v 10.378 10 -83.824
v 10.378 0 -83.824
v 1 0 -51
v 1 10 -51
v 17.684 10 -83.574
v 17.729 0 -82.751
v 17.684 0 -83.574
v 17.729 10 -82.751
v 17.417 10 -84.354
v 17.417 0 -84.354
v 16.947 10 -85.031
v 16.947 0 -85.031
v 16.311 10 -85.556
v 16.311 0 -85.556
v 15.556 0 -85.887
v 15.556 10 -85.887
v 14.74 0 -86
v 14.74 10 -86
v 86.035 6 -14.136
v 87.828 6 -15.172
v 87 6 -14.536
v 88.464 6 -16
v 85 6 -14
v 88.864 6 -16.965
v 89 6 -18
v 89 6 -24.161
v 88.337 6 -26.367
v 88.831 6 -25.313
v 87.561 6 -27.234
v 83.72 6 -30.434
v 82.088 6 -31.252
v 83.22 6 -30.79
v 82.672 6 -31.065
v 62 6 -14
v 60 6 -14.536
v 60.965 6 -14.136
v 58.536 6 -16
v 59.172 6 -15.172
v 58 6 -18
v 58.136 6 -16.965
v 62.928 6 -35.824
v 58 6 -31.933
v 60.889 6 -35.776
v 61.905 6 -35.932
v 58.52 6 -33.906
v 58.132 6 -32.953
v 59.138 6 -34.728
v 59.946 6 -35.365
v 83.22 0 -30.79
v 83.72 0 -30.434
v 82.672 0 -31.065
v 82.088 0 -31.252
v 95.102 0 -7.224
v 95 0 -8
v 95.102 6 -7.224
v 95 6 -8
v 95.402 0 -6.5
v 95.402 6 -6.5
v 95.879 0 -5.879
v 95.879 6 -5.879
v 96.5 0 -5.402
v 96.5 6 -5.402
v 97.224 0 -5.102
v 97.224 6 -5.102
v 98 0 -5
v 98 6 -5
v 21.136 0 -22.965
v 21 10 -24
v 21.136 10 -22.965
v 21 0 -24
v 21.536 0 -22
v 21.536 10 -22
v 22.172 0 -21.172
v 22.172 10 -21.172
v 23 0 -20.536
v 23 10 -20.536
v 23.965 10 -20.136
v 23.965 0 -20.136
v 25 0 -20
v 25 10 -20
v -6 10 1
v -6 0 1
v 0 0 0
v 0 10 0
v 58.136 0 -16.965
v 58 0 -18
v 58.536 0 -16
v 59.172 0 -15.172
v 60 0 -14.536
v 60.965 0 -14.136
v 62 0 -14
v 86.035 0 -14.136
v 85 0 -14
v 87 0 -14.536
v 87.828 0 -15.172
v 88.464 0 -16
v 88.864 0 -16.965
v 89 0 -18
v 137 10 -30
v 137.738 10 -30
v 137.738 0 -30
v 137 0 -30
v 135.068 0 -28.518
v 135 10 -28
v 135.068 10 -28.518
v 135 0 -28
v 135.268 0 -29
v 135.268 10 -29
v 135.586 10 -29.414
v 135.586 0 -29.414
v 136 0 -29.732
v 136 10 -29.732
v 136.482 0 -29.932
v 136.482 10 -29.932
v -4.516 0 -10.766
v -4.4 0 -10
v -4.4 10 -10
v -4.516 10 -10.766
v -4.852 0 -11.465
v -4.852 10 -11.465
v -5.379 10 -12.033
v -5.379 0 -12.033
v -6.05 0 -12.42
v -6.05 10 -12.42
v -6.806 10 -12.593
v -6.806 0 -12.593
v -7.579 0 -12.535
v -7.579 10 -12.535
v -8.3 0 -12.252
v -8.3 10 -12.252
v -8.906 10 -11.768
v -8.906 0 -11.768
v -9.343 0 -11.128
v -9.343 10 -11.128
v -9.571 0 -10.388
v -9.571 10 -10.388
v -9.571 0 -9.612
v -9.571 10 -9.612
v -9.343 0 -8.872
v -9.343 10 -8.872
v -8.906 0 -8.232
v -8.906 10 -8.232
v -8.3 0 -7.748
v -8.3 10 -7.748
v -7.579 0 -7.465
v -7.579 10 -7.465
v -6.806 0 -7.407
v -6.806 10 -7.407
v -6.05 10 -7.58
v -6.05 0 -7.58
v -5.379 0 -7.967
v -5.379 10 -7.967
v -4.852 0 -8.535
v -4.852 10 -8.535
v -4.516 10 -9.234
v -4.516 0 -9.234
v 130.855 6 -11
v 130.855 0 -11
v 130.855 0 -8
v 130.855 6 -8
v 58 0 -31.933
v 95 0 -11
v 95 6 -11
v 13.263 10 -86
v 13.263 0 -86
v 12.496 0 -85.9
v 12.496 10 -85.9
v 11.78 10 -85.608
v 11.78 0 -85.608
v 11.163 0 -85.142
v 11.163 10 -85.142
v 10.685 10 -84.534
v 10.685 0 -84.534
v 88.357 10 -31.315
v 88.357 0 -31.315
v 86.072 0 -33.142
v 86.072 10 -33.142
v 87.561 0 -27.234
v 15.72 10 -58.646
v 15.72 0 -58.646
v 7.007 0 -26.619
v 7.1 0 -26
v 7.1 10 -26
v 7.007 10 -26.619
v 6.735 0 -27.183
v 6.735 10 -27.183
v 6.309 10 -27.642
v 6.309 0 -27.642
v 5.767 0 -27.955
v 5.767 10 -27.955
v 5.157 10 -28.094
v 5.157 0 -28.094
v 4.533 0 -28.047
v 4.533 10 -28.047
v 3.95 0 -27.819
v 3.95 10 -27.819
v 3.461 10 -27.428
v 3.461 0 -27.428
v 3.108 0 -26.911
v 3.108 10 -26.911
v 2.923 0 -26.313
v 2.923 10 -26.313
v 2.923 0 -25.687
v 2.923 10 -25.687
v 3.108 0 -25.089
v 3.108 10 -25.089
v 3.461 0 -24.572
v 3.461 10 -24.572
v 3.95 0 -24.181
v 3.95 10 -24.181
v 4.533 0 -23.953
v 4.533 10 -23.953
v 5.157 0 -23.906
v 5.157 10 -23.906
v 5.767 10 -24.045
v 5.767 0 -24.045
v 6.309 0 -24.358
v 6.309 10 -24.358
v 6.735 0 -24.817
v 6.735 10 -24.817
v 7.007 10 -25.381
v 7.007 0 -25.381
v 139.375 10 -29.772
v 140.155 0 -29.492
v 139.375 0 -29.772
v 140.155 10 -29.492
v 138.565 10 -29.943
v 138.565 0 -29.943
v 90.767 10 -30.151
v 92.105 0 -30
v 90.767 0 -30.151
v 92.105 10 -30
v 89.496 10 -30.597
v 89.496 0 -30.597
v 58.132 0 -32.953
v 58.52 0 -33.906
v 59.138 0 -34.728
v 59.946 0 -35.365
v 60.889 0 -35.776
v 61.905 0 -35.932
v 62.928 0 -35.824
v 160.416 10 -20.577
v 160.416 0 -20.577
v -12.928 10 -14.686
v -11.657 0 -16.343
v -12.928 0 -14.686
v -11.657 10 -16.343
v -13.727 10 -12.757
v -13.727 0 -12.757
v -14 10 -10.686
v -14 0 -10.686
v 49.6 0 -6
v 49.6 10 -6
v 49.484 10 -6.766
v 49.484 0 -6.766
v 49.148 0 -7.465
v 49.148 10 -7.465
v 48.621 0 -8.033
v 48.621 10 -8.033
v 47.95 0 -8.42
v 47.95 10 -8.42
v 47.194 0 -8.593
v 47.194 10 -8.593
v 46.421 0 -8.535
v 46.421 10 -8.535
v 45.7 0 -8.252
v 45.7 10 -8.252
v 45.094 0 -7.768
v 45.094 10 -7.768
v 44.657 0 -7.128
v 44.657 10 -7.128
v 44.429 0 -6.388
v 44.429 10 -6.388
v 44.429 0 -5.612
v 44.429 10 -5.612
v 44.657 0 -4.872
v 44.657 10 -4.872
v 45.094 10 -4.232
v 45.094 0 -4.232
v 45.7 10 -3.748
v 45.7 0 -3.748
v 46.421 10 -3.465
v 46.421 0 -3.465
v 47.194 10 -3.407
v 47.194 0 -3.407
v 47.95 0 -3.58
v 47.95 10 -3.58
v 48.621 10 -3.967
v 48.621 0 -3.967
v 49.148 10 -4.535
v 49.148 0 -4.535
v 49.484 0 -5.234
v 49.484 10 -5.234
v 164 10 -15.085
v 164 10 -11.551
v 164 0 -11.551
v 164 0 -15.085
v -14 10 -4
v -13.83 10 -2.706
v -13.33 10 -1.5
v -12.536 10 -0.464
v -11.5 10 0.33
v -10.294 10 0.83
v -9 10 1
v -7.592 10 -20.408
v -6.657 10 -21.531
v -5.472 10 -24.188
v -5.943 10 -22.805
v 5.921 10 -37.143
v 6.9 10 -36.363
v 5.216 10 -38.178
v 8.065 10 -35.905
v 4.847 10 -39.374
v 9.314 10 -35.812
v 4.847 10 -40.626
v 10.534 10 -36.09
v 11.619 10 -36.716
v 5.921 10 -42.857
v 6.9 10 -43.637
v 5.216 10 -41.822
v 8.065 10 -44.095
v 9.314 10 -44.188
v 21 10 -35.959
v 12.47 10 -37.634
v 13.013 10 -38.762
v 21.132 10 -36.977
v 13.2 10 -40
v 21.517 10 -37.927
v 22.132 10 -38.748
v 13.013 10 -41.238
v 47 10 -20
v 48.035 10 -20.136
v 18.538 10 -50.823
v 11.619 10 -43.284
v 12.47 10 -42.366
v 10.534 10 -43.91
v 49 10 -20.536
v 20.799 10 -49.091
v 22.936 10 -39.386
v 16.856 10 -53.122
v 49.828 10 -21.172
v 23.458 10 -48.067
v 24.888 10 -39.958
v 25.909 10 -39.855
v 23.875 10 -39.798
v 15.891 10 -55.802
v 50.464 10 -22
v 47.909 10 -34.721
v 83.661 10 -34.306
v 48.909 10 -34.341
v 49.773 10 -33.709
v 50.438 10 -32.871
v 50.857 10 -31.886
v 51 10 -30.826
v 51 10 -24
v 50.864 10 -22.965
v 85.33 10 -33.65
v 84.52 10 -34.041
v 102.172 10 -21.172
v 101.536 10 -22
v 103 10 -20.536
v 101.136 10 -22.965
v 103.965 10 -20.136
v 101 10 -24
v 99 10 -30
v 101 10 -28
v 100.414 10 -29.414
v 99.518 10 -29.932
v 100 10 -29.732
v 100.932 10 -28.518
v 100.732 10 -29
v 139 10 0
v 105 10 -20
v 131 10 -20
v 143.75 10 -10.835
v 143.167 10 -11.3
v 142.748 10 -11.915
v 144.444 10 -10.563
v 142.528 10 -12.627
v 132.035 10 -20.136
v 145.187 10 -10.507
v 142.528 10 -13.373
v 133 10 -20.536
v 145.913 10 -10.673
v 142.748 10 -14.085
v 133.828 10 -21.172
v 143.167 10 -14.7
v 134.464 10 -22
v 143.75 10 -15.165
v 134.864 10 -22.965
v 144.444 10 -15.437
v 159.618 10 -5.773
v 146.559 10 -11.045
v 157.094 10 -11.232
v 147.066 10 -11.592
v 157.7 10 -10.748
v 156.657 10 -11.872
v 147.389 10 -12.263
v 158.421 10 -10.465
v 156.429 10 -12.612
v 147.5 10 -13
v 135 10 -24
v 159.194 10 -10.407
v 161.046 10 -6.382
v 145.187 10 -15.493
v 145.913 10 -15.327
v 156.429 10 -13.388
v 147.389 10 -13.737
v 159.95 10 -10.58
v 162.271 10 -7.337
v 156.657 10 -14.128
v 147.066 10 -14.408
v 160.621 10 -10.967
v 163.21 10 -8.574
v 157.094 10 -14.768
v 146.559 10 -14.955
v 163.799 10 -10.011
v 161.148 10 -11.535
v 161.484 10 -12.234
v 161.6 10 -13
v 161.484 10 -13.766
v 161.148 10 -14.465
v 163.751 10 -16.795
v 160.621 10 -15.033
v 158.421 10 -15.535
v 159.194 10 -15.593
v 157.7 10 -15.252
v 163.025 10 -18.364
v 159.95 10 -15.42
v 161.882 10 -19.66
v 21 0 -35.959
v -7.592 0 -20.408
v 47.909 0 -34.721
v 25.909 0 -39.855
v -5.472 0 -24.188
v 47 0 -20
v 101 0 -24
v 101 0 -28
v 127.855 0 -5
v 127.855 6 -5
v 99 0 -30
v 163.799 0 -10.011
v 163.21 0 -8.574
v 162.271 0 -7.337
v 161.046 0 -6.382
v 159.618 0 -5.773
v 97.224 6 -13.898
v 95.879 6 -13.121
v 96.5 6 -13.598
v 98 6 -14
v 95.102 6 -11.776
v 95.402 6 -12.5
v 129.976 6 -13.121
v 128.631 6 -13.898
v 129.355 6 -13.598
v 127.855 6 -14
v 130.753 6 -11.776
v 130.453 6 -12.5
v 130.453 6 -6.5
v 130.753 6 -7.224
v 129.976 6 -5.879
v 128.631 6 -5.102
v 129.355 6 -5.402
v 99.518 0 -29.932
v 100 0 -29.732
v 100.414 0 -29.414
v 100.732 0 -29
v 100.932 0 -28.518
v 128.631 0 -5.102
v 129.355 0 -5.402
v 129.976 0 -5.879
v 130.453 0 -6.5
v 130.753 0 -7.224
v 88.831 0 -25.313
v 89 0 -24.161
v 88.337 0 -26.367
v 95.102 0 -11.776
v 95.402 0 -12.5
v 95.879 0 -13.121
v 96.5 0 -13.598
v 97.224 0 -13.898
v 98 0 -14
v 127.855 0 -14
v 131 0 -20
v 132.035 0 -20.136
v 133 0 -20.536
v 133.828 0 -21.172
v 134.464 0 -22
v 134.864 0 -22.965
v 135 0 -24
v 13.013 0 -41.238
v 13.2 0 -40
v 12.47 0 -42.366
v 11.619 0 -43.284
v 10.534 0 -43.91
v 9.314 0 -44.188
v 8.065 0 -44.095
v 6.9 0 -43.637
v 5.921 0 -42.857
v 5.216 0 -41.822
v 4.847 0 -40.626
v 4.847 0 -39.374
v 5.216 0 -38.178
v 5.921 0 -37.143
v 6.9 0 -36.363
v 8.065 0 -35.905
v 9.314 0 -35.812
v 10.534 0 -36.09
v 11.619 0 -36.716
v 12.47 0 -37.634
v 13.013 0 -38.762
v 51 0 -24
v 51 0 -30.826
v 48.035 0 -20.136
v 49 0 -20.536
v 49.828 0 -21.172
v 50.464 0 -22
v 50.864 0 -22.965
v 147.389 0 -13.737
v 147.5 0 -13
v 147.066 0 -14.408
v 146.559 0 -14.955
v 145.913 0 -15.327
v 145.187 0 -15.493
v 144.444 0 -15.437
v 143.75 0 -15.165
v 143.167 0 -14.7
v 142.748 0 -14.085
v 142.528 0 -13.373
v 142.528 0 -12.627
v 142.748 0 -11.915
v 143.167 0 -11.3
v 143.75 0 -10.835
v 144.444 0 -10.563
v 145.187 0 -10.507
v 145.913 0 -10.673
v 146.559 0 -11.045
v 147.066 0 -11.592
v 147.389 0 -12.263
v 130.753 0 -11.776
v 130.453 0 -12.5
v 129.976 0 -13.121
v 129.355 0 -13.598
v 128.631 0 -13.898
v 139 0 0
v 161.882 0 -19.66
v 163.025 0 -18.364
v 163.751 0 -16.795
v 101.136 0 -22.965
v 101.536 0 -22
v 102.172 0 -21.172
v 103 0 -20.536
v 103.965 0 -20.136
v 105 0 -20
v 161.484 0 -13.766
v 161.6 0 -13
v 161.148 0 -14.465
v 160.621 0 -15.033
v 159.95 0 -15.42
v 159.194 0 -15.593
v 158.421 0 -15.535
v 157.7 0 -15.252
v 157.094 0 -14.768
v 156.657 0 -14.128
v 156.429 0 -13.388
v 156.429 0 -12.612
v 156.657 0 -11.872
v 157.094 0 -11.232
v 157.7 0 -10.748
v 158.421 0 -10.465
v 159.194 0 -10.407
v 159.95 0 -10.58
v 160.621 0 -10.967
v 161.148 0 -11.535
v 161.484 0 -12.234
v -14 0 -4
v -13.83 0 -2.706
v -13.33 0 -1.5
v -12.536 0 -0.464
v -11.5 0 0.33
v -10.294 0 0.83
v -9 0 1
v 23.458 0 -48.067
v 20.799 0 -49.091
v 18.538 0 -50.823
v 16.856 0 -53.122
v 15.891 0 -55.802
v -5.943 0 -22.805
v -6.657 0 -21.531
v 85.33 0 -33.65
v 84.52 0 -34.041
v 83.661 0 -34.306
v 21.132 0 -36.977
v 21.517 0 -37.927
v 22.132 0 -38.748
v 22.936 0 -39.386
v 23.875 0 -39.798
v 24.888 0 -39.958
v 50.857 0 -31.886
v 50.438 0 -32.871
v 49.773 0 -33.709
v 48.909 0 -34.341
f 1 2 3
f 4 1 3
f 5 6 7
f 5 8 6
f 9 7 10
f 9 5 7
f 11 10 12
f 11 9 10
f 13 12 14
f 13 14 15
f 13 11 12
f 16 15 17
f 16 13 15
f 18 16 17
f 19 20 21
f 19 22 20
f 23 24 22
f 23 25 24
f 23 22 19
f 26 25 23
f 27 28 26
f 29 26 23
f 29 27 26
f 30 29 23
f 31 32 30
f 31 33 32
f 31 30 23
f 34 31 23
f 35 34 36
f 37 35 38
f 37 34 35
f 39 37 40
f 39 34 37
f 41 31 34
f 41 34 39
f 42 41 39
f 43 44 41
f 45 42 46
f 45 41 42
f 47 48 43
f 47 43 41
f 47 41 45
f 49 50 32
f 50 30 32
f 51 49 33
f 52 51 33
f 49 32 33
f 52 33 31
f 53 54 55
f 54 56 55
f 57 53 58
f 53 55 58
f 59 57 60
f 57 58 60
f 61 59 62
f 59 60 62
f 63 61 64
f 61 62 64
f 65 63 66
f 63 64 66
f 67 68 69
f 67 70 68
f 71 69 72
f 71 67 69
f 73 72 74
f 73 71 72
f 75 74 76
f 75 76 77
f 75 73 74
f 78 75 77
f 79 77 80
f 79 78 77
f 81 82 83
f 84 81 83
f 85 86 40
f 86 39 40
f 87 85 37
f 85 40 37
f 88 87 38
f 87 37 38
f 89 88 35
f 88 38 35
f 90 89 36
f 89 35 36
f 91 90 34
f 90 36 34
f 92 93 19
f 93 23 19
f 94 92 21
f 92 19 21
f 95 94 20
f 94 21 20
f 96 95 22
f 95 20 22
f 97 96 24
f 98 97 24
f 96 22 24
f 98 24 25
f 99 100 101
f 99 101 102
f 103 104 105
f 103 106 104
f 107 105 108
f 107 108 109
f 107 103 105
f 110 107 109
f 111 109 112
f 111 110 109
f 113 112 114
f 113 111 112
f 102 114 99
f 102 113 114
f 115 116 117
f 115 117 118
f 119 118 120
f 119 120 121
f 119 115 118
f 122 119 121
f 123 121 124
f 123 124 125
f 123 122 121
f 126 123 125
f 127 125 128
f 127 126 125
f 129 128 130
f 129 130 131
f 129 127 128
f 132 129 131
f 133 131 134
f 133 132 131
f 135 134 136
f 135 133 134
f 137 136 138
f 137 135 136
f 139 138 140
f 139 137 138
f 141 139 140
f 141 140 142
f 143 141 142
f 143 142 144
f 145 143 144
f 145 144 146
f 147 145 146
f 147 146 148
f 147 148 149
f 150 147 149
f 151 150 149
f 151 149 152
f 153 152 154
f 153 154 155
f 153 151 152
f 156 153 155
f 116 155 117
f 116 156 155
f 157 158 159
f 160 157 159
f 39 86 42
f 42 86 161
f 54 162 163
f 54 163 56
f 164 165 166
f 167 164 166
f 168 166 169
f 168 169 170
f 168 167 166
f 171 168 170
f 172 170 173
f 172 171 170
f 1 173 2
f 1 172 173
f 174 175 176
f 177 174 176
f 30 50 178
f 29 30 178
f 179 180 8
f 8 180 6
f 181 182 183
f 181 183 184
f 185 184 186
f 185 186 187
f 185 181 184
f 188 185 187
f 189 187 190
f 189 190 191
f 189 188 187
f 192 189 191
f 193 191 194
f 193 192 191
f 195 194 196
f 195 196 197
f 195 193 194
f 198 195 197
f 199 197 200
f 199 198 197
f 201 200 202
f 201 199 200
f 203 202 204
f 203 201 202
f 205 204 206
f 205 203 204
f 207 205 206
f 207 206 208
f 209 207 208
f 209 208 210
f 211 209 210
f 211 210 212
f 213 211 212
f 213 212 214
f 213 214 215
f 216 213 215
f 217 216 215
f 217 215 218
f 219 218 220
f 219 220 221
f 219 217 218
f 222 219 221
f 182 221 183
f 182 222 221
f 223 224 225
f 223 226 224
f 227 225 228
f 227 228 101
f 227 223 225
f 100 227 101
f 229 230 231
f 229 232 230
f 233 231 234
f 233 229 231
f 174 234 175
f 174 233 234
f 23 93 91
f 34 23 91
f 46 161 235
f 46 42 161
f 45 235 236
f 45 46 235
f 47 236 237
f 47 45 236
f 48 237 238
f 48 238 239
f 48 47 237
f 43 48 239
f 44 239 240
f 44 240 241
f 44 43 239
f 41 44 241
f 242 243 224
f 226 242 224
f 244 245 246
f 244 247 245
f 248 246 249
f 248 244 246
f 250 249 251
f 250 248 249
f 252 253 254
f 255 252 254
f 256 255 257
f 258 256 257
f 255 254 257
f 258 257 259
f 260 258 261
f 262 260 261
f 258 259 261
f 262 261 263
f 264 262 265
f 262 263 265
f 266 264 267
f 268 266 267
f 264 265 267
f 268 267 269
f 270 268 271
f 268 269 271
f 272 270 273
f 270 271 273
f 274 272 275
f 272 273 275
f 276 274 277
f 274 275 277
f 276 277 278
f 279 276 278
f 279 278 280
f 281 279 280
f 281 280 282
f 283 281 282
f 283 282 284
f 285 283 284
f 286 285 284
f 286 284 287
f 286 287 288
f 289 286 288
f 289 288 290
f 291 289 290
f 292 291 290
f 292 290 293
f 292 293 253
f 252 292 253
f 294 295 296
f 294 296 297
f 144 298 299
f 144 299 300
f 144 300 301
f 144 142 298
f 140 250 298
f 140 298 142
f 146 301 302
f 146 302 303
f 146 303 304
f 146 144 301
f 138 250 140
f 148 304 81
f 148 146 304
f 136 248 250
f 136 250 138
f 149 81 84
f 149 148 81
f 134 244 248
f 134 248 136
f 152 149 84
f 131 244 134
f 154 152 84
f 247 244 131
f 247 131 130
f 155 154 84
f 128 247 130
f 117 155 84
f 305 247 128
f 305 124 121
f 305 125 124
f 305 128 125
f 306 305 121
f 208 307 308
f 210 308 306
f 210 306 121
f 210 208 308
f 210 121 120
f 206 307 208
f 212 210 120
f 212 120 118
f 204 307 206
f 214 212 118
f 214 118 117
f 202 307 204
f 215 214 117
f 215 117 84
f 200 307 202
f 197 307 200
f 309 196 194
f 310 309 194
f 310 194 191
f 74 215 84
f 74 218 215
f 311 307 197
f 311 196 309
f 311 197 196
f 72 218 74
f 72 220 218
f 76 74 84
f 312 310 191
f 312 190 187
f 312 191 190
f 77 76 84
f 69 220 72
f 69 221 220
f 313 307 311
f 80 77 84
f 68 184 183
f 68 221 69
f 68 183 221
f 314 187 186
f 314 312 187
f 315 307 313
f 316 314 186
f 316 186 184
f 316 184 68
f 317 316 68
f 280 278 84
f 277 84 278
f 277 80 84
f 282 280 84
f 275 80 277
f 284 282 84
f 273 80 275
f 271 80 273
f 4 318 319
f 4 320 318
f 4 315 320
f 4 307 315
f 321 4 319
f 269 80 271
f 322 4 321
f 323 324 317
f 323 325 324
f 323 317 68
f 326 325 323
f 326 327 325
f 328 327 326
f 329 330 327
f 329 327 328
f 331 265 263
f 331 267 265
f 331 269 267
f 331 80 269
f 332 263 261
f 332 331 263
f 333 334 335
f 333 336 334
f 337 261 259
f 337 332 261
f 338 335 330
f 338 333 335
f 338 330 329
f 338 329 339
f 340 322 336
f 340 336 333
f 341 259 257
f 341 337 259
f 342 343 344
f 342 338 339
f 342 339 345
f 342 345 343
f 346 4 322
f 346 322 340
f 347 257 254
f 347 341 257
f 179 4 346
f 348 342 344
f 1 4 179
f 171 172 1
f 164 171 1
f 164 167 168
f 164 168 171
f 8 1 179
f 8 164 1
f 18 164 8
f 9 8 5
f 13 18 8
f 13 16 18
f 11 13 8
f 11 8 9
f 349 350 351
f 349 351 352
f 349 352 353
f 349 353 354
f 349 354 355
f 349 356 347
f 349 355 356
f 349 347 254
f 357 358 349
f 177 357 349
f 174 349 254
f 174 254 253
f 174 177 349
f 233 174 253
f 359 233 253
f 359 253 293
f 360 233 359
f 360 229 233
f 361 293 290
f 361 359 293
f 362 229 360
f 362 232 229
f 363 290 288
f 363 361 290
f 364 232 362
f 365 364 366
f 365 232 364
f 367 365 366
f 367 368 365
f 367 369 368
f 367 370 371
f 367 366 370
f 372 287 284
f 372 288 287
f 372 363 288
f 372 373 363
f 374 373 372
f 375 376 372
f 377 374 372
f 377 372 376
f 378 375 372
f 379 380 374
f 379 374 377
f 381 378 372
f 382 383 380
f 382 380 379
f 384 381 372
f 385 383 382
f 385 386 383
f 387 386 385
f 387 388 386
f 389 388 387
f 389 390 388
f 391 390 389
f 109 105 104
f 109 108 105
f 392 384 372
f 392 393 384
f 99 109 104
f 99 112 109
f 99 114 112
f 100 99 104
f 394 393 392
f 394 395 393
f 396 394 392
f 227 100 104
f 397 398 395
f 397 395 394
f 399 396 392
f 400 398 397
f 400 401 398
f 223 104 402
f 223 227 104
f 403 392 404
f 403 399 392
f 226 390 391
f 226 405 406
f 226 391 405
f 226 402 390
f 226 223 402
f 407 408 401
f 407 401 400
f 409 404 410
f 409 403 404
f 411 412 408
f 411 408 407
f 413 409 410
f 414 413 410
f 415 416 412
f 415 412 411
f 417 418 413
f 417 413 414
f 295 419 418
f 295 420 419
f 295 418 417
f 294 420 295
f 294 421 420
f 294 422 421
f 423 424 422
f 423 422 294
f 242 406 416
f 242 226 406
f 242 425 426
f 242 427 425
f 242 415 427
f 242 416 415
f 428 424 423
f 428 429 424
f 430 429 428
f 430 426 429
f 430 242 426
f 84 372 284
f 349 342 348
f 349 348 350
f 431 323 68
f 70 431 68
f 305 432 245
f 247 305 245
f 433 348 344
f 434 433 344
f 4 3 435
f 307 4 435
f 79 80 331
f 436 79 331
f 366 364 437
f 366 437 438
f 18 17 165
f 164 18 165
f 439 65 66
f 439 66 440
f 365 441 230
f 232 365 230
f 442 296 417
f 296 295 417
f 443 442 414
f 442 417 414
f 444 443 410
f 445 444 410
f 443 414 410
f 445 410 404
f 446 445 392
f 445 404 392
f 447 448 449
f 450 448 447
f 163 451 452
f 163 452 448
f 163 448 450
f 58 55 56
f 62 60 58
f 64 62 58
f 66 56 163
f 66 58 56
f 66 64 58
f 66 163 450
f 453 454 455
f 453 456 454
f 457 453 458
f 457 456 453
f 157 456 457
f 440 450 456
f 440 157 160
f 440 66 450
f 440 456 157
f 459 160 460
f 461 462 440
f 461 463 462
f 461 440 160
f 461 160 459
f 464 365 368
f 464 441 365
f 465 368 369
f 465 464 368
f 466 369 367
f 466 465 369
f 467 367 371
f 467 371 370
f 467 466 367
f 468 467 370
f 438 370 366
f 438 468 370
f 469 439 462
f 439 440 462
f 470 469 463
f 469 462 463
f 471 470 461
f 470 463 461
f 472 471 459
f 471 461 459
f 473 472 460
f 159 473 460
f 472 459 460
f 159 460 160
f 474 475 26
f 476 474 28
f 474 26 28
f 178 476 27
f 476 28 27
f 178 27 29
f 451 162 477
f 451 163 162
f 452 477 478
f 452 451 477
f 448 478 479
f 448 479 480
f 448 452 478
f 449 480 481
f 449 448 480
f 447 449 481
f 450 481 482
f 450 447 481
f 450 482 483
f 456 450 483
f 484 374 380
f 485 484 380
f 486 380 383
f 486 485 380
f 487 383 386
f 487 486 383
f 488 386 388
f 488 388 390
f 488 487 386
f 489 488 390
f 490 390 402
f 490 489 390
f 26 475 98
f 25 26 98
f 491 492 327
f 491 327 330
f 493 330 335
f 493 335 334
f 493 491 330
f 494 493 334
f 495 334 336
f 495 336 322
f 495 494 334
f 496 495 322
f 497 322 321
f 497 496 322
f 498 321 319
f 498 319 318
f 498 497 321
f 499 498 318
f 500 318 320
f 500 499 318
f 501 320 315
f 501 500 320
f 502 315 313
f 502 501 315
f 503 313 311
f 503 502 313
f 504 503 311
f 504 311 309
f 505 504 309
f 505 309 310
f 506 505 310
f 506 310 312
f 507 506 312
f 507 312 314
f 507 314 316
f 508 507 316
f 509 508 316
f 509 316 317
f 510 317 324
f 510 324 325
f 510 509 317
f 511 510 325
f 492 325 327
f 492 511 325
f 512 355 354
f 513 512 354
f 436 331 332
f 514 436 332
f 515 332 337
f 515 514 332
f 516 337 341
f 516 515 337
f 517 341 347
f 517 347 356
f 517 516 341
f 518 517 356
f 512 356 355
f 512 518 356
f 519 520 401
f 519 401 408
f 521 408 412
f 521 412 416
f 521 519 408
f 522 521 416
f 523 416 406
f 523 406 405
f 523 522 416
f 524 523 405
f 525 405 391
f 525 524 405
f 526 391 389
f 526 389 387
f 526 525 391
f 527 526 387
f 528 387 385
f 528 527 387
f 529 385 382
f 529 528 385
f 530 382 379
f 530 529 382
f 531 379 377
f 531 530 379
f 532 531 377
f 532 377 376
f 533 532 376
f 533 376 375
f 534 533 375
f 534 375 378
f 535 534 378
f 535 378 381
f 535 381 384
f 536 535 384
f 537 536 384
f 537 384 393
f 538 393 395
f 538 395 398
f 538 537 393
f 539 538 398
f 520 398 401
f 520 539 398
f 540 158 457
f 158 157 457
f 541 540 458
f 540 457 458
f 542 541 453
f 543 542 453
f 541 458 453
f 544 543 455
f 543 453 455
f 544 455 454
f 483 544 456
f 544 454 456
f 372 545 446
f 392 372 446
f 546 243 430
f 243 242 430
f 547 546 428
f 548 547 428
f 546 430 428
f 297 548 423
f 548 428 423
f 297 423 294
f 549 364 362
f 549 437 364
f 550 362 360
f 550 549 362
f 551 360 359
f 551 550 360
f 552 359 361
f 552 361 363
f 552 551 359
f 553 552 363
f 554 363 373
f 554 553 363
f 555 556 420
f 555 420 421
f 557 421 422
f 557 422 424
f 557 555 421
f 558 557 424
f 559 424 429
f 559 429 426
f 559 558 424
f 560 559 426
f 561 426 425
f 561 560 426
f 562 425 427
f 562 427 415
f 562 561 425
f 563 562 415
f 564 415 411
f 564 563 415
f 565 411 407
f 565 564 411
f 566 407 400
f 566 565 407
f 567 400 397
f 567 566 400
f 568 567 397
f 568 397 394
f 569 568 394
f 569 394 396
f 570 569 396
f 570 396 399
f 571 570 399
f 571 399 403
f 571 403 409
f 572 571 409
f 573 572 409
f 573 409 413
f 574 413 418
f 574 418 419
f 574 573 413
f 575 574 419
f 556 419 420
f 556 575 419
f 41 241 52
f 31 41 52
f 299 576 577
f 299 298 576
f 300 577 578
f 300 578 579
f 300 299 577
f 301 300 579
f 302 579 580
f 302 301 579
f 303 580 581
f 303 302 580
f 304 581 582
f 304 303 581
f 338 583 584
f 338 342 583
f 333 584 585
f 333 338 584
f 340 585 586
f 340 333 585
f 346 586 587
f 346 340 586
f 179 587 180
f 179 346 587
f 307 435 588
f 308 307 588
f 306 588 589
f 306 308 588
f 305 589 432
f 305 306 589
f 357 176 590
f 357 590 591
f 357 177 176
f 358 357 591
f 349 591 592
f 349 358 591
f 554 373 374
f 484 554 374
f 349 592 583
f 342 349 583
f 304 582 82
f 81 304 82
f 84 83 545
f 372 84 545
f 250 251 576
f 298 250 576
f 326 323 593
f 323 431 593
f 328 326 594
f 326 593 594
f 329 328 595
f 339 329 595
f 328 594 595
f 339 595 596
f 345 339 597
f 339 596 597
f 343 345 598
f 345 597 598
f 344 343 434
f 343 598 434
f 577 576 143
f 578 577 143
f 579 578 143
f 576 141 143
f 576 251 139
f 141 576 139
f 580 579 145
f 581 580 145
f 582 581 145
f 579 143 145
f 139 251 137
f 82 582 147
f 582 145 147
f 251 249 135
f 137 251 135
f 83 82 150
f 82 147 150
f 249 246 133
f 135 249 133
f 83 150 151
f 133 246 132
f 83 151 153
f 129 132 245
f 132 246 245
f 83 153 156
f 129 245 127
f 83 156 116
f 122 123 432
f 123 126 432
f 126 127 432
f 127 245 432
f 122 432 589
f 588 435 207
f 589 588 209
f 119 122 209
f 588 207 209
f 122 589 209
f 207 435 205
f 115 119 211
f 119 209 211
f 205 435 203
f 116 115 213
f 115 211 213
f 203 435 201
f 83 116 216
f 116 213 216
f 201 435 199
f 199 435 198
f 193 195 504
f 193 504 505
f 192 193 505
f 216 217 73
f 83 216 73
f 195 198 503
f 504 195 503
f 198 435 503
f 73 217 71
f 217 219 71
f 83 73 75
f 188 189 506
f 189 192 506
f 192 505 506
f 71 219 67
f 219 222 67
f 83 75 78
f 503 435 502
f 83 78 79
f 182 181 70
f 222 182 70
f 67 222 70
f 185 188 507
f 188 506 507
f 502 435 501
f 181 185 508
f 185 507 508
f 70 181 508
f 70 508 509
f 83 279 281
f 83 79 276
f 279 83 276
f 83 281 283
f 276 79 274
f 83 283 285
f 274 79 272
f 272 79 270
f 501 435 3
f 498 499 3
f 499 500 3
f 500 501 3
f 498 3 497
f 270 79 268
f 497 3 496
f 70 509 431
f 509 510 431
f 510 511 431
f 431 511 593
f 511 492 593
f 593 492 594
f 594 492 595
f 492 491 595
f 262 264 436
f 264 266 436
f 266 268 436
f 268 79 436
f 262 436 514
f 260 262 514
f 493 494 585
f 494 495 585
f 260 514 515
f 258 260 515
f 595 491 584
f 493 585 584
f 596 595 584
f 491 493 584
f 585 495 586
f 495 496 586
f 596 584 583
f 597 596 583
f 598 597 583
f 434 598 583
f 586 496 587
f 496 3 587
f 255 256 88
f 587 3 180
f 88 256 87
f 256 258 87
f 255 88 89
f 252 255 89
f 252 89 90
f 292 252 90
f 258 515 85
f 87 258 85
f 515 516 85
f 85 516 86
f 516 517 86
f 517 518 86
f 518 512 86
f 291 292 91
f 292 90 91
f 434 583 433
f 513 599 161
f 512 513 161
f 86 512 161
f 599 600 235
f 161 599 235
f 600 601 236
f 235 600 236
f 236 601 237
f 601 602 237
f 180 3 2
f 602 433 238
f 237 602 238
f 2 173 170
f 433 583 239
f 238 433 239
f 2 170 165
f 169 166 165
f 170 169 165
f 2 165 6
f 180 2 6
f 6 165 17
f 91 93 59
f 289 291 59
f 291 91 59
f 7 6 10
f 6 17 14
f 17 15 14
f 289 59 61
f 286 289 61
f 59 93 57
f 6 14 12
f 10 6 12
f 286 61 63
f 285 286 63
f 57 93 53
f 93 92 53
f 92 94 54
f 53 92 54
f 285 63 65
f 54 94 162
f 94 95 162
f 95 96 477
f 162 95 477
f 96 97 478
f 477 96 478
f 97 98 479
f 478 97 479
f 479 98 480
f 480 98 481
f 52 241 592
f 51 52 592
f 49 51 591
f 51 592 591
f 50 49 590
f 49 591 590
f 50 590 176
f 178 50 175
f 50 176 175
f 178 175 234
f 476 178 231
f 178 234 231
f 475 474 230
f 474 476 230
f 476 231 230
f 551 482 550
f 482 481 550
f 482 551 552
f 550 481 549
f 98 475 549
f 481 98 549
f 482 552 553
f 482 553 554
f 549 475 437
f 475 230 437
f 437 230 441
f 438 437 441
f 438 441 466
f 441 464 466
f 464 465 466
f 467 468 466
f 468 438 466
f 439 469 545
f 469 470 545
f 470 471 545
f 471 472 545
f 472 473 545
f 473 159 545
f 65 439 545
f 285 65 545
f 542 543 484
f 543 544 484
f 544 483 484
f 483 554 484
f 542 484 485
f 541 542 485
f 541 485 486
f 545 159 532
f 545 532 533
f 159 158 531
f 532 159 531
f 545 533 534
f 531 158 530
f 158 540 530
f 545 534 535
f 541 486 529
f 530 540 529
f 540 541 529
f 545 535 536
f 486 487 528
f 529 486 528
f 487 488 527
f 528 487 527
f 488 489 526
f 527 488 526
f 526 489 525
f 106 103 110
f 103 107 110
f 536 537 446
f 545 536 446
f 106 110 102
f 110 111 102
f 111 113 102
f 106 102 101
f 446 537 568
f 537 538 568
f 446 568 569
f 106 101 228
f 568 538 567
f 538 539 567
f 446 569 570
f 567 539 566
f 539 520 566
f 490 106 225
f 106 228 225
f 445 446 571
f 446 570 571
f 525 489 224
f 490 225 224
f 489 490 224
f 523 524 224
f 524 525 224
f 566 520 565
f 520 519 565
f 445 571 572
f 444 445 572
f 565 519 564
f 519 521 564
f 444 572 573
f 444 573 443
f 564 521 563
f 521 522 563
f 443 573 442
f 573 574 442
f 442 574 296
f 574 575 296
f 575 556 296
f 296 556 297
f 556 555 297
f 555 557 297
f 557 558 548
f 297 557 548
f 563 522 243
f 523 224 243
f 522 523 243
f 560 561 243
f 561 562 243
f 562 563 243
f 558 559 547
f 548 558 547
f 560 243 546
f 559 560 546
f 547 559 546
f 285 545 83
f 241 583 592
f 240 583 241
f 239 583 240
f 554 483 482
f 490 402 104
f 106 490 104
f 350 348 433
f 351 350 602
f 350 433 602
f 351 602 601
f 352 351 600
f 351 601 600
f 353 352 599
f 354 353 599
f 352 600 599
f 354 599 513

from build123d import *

# Parameters (mm, degrees)
SKETCH1_R           = 2.6
SKETCH1_R_2         = 2.1
SKETCH1_R_3         = 4.2
SKETCH1_R_4         = 2.5
BOSS_EXTRUDE1_DEPTH = 10
FILLET2_R           = 6
FILLET3_R           = 3
CUT_EXTRUDE1_DEPTH  = 11
SKETCH7_R           = 2.6
CUT_EXTRUDE4_DEPTH  = 11
FILLET8_R           = 5
FILLET9_R           = 4
SKETCH10_W          = 34
SKETCH10_H          = 10
CUT_EXTRUDE6_DEPTH  = 11
FILLET10_R          = 4
CUT_EXTRUDE7_DEPTH  = 6
FILLET14_R          = 6
FILLET15_R          = 2
FILLET16_R          = 10
FILLET17_R          = 8
FILLET18_R          = 4
SKETCH13_W          = 35.854861743
SKETCH13_H          = 9
CUT_EXTRUDE8_DEPTH  = 6
FILLET19_R          = 3


with BuildPart() as part:
    # Sketch1 → Boss-Extrude1 (new body)
    with BuildSketch(Plane(origin=(0, 0, 0), x_dir=(1, 0, 0), z_dir=(0, 1, 0))):
        Polygon((164, 19), (139, 30), (90, 30), (85, 34), (15, 50), (18, 86), (11, 86), (1, 51), (-6, 22), (-14, 14), (-14, 2), (-14, -1), (-6, -1), (0, 0), (139, 0), (164, 7), align=None)
        with Locations((-7, 10)):
            Circle(SKETCH1_R, mode=Mode.SUBTRACT)
        with Locations((159, 13)):
            Circle(SKETCH1_R, mode=Mode.SUBTRACT)
        with Locations((5, 26)):
            Circle(SKETCH1_R_2, mode=Mode.SUBTRACT)
        with Locations((9, 40)):
            Circle(SKETCH1_R_3, mode=Mode.SUBTRACT)
        with Locations((145, 13)):
            Circle(SKETCH1_R_4, mode=Mode.SUBTRACT)
    extrude(amount=BOSS_EXTRUDE1_DEPTH)

    # Fillet2
    fillet2_edges = [part.edges().sort_by_distance(p)[0] for p in [
        (139, 5, -30),
        (164, 5, -19),
        (164, 5, -7),
    ]]
    fillet(fillet2_edges, radius=FILLET2_R)

    # Fillet3
    fillet3_edges = [part.edges().sort_by_distance(p)[0] for p in [
        (11, 5, -86),
        (18, 5, -86),
    ]]
    fillet(fillet3_edges, radius=FILLET3_R)

    # Sketch4 → Cut-Extrude1 (cut, through all)
    with BuildSketch(Plane(origin=(0, 10, 0), x_dir=(1, 0, 0), z_dir=(0, 1, 0))):
        Polygon((21, 41), (21, 20), (51, 20), (51, 34), align=None)
    extrude(amount=-CUT_EXTRUDE1_DEPTH, mode=Mode.SUBTRACT)

    # Sketch7 → Cut-Extrude4 (cut, through all)
    with BuildSketch(Plane(origin=(0, 10, 0), x_dir=(1, 0, 0), z_dir=(0, 1, 0))):
        with Locations((47, 6)):
            Circle(SKETCH7_R)
    extrude(amount=-CUT_EXTRUDE4_DEPTH, mode=Mode.SUBTRACT)

    # Fillet8
    fillet8_edges = [part.edges().sort_by_distance(p)[0] for p in [
        (-14, 5, 1),
    ]]
    fillet(fillet8_edges, radius=FILLET8_R)

    # Fillet9
    fillet9_edges = [part.edges().sort_by_distance(p)[0] for p in [
        (21, 5, -41),
        (51, 5, -34),
        (51, 5, -20),
        (21, 5, -20),
    ]]
    fillet(fillet9_edges, radius=FILLET9_R)

    # Sketch10 → Cut-Extrude6 (cut, through all)
    with BuildSketch(Plane(origin=(0, 10, 0), x_dir=(1, 0, 0), z_dir=(0, 1, 0))):
        with Locations((118, 25)):
            Rectangle(SKETCH10_W, SKETCH10_H)
    extrude(amount=-CUT_EXTRUDE6_DEPTH, mode=Mode.SUBTRACT)

    # Fillet10
    fillet10_edges = [part.edges().sort_by_distance(p)[0] for p in [
        (135, 5, -20),
        (101, 5, -20),
    ]]
    fillet(fillet10_edges, radius=FILLET10_R)

    # Sketch12 → Cut-Extrude7 (cut)
    with BuildSketch(Plane(origin=(0, 0, 0), x_dir=(1, 0, 0), z_dir=(0, 1, 0))):
        Polygon((58, 37), (83, 31.034746853), (89, 26.034746853), (89, 14), (58, 14), align=None)
    extrude(amount=CUT_EXTRUDE7_DEPTH, mode=Mode.SUBTRACT)

    # Fillet14
    fillet14_edges = [part.edges().sort_by_distance(p)[0] for p in [
        (85, 5, -34),
        (90, 5, -30),
    ]]
    fillet(fillet14_edges, radius=FILLET14_R)

    # Fillet15
    fillet15_edges = [part.edges().sort_by_distance(p)[0] for p in [
        (101, 5, -30),
        (135, 5, -30),
    ]]
    fillet(fillet15_edges, radius=FILLET15_R)

    # Fillet16
    fillet16_edges = [part.edges().sort_by_distance(p)[0] for p in [
        (15, 5, -50),
    ]]
    fillet(fillet16_edges, radius=FILLET16_R)

    # Fillet17
    fillet17_edges = [part.edges().sort_by_distance(p)[0] for p in [
        (-14, 5, -14),
        (-6, 5, -22),
    ]]
    fillet(fillet17_edges, radius=FILLET17_R)

    # Fillet18
    fillet18_edges = [part.edges().sort_by_distance(p)[0] for p in [
        (58, 3, -37),
        (58, 3, -14),
        (89, 3, -14),
        (89, 3, -26.034746853),
        (83, 3, -31.034746853),
    ]]
    fillet(fillet18_edges, radius=FILLET18_R)

    # Sketch13 → Cut-Extrude8 (cut)
    with BuildSketch(Plane.XZ):
        with Locations((112.927430872, -9.5)):
            Rectangle(SKETCH13_W, SKETCH13_H)
    extrude(amount=-CUT_EXTRUDE8_DEPTH, mode=Mode.SUBTRACT)

    # Fillet19
    fillet19_edges = [part.edges().sort_by_distance(p)[0] for p in [
        (130.854861743, 3, -5),
        (130.854861743, 3, -14),
        (95, 3, -14),
        (95, 3, -5),
    ]]
    fillet(fillet19_edges, radius=FILLET19_R)


solid = part.part
